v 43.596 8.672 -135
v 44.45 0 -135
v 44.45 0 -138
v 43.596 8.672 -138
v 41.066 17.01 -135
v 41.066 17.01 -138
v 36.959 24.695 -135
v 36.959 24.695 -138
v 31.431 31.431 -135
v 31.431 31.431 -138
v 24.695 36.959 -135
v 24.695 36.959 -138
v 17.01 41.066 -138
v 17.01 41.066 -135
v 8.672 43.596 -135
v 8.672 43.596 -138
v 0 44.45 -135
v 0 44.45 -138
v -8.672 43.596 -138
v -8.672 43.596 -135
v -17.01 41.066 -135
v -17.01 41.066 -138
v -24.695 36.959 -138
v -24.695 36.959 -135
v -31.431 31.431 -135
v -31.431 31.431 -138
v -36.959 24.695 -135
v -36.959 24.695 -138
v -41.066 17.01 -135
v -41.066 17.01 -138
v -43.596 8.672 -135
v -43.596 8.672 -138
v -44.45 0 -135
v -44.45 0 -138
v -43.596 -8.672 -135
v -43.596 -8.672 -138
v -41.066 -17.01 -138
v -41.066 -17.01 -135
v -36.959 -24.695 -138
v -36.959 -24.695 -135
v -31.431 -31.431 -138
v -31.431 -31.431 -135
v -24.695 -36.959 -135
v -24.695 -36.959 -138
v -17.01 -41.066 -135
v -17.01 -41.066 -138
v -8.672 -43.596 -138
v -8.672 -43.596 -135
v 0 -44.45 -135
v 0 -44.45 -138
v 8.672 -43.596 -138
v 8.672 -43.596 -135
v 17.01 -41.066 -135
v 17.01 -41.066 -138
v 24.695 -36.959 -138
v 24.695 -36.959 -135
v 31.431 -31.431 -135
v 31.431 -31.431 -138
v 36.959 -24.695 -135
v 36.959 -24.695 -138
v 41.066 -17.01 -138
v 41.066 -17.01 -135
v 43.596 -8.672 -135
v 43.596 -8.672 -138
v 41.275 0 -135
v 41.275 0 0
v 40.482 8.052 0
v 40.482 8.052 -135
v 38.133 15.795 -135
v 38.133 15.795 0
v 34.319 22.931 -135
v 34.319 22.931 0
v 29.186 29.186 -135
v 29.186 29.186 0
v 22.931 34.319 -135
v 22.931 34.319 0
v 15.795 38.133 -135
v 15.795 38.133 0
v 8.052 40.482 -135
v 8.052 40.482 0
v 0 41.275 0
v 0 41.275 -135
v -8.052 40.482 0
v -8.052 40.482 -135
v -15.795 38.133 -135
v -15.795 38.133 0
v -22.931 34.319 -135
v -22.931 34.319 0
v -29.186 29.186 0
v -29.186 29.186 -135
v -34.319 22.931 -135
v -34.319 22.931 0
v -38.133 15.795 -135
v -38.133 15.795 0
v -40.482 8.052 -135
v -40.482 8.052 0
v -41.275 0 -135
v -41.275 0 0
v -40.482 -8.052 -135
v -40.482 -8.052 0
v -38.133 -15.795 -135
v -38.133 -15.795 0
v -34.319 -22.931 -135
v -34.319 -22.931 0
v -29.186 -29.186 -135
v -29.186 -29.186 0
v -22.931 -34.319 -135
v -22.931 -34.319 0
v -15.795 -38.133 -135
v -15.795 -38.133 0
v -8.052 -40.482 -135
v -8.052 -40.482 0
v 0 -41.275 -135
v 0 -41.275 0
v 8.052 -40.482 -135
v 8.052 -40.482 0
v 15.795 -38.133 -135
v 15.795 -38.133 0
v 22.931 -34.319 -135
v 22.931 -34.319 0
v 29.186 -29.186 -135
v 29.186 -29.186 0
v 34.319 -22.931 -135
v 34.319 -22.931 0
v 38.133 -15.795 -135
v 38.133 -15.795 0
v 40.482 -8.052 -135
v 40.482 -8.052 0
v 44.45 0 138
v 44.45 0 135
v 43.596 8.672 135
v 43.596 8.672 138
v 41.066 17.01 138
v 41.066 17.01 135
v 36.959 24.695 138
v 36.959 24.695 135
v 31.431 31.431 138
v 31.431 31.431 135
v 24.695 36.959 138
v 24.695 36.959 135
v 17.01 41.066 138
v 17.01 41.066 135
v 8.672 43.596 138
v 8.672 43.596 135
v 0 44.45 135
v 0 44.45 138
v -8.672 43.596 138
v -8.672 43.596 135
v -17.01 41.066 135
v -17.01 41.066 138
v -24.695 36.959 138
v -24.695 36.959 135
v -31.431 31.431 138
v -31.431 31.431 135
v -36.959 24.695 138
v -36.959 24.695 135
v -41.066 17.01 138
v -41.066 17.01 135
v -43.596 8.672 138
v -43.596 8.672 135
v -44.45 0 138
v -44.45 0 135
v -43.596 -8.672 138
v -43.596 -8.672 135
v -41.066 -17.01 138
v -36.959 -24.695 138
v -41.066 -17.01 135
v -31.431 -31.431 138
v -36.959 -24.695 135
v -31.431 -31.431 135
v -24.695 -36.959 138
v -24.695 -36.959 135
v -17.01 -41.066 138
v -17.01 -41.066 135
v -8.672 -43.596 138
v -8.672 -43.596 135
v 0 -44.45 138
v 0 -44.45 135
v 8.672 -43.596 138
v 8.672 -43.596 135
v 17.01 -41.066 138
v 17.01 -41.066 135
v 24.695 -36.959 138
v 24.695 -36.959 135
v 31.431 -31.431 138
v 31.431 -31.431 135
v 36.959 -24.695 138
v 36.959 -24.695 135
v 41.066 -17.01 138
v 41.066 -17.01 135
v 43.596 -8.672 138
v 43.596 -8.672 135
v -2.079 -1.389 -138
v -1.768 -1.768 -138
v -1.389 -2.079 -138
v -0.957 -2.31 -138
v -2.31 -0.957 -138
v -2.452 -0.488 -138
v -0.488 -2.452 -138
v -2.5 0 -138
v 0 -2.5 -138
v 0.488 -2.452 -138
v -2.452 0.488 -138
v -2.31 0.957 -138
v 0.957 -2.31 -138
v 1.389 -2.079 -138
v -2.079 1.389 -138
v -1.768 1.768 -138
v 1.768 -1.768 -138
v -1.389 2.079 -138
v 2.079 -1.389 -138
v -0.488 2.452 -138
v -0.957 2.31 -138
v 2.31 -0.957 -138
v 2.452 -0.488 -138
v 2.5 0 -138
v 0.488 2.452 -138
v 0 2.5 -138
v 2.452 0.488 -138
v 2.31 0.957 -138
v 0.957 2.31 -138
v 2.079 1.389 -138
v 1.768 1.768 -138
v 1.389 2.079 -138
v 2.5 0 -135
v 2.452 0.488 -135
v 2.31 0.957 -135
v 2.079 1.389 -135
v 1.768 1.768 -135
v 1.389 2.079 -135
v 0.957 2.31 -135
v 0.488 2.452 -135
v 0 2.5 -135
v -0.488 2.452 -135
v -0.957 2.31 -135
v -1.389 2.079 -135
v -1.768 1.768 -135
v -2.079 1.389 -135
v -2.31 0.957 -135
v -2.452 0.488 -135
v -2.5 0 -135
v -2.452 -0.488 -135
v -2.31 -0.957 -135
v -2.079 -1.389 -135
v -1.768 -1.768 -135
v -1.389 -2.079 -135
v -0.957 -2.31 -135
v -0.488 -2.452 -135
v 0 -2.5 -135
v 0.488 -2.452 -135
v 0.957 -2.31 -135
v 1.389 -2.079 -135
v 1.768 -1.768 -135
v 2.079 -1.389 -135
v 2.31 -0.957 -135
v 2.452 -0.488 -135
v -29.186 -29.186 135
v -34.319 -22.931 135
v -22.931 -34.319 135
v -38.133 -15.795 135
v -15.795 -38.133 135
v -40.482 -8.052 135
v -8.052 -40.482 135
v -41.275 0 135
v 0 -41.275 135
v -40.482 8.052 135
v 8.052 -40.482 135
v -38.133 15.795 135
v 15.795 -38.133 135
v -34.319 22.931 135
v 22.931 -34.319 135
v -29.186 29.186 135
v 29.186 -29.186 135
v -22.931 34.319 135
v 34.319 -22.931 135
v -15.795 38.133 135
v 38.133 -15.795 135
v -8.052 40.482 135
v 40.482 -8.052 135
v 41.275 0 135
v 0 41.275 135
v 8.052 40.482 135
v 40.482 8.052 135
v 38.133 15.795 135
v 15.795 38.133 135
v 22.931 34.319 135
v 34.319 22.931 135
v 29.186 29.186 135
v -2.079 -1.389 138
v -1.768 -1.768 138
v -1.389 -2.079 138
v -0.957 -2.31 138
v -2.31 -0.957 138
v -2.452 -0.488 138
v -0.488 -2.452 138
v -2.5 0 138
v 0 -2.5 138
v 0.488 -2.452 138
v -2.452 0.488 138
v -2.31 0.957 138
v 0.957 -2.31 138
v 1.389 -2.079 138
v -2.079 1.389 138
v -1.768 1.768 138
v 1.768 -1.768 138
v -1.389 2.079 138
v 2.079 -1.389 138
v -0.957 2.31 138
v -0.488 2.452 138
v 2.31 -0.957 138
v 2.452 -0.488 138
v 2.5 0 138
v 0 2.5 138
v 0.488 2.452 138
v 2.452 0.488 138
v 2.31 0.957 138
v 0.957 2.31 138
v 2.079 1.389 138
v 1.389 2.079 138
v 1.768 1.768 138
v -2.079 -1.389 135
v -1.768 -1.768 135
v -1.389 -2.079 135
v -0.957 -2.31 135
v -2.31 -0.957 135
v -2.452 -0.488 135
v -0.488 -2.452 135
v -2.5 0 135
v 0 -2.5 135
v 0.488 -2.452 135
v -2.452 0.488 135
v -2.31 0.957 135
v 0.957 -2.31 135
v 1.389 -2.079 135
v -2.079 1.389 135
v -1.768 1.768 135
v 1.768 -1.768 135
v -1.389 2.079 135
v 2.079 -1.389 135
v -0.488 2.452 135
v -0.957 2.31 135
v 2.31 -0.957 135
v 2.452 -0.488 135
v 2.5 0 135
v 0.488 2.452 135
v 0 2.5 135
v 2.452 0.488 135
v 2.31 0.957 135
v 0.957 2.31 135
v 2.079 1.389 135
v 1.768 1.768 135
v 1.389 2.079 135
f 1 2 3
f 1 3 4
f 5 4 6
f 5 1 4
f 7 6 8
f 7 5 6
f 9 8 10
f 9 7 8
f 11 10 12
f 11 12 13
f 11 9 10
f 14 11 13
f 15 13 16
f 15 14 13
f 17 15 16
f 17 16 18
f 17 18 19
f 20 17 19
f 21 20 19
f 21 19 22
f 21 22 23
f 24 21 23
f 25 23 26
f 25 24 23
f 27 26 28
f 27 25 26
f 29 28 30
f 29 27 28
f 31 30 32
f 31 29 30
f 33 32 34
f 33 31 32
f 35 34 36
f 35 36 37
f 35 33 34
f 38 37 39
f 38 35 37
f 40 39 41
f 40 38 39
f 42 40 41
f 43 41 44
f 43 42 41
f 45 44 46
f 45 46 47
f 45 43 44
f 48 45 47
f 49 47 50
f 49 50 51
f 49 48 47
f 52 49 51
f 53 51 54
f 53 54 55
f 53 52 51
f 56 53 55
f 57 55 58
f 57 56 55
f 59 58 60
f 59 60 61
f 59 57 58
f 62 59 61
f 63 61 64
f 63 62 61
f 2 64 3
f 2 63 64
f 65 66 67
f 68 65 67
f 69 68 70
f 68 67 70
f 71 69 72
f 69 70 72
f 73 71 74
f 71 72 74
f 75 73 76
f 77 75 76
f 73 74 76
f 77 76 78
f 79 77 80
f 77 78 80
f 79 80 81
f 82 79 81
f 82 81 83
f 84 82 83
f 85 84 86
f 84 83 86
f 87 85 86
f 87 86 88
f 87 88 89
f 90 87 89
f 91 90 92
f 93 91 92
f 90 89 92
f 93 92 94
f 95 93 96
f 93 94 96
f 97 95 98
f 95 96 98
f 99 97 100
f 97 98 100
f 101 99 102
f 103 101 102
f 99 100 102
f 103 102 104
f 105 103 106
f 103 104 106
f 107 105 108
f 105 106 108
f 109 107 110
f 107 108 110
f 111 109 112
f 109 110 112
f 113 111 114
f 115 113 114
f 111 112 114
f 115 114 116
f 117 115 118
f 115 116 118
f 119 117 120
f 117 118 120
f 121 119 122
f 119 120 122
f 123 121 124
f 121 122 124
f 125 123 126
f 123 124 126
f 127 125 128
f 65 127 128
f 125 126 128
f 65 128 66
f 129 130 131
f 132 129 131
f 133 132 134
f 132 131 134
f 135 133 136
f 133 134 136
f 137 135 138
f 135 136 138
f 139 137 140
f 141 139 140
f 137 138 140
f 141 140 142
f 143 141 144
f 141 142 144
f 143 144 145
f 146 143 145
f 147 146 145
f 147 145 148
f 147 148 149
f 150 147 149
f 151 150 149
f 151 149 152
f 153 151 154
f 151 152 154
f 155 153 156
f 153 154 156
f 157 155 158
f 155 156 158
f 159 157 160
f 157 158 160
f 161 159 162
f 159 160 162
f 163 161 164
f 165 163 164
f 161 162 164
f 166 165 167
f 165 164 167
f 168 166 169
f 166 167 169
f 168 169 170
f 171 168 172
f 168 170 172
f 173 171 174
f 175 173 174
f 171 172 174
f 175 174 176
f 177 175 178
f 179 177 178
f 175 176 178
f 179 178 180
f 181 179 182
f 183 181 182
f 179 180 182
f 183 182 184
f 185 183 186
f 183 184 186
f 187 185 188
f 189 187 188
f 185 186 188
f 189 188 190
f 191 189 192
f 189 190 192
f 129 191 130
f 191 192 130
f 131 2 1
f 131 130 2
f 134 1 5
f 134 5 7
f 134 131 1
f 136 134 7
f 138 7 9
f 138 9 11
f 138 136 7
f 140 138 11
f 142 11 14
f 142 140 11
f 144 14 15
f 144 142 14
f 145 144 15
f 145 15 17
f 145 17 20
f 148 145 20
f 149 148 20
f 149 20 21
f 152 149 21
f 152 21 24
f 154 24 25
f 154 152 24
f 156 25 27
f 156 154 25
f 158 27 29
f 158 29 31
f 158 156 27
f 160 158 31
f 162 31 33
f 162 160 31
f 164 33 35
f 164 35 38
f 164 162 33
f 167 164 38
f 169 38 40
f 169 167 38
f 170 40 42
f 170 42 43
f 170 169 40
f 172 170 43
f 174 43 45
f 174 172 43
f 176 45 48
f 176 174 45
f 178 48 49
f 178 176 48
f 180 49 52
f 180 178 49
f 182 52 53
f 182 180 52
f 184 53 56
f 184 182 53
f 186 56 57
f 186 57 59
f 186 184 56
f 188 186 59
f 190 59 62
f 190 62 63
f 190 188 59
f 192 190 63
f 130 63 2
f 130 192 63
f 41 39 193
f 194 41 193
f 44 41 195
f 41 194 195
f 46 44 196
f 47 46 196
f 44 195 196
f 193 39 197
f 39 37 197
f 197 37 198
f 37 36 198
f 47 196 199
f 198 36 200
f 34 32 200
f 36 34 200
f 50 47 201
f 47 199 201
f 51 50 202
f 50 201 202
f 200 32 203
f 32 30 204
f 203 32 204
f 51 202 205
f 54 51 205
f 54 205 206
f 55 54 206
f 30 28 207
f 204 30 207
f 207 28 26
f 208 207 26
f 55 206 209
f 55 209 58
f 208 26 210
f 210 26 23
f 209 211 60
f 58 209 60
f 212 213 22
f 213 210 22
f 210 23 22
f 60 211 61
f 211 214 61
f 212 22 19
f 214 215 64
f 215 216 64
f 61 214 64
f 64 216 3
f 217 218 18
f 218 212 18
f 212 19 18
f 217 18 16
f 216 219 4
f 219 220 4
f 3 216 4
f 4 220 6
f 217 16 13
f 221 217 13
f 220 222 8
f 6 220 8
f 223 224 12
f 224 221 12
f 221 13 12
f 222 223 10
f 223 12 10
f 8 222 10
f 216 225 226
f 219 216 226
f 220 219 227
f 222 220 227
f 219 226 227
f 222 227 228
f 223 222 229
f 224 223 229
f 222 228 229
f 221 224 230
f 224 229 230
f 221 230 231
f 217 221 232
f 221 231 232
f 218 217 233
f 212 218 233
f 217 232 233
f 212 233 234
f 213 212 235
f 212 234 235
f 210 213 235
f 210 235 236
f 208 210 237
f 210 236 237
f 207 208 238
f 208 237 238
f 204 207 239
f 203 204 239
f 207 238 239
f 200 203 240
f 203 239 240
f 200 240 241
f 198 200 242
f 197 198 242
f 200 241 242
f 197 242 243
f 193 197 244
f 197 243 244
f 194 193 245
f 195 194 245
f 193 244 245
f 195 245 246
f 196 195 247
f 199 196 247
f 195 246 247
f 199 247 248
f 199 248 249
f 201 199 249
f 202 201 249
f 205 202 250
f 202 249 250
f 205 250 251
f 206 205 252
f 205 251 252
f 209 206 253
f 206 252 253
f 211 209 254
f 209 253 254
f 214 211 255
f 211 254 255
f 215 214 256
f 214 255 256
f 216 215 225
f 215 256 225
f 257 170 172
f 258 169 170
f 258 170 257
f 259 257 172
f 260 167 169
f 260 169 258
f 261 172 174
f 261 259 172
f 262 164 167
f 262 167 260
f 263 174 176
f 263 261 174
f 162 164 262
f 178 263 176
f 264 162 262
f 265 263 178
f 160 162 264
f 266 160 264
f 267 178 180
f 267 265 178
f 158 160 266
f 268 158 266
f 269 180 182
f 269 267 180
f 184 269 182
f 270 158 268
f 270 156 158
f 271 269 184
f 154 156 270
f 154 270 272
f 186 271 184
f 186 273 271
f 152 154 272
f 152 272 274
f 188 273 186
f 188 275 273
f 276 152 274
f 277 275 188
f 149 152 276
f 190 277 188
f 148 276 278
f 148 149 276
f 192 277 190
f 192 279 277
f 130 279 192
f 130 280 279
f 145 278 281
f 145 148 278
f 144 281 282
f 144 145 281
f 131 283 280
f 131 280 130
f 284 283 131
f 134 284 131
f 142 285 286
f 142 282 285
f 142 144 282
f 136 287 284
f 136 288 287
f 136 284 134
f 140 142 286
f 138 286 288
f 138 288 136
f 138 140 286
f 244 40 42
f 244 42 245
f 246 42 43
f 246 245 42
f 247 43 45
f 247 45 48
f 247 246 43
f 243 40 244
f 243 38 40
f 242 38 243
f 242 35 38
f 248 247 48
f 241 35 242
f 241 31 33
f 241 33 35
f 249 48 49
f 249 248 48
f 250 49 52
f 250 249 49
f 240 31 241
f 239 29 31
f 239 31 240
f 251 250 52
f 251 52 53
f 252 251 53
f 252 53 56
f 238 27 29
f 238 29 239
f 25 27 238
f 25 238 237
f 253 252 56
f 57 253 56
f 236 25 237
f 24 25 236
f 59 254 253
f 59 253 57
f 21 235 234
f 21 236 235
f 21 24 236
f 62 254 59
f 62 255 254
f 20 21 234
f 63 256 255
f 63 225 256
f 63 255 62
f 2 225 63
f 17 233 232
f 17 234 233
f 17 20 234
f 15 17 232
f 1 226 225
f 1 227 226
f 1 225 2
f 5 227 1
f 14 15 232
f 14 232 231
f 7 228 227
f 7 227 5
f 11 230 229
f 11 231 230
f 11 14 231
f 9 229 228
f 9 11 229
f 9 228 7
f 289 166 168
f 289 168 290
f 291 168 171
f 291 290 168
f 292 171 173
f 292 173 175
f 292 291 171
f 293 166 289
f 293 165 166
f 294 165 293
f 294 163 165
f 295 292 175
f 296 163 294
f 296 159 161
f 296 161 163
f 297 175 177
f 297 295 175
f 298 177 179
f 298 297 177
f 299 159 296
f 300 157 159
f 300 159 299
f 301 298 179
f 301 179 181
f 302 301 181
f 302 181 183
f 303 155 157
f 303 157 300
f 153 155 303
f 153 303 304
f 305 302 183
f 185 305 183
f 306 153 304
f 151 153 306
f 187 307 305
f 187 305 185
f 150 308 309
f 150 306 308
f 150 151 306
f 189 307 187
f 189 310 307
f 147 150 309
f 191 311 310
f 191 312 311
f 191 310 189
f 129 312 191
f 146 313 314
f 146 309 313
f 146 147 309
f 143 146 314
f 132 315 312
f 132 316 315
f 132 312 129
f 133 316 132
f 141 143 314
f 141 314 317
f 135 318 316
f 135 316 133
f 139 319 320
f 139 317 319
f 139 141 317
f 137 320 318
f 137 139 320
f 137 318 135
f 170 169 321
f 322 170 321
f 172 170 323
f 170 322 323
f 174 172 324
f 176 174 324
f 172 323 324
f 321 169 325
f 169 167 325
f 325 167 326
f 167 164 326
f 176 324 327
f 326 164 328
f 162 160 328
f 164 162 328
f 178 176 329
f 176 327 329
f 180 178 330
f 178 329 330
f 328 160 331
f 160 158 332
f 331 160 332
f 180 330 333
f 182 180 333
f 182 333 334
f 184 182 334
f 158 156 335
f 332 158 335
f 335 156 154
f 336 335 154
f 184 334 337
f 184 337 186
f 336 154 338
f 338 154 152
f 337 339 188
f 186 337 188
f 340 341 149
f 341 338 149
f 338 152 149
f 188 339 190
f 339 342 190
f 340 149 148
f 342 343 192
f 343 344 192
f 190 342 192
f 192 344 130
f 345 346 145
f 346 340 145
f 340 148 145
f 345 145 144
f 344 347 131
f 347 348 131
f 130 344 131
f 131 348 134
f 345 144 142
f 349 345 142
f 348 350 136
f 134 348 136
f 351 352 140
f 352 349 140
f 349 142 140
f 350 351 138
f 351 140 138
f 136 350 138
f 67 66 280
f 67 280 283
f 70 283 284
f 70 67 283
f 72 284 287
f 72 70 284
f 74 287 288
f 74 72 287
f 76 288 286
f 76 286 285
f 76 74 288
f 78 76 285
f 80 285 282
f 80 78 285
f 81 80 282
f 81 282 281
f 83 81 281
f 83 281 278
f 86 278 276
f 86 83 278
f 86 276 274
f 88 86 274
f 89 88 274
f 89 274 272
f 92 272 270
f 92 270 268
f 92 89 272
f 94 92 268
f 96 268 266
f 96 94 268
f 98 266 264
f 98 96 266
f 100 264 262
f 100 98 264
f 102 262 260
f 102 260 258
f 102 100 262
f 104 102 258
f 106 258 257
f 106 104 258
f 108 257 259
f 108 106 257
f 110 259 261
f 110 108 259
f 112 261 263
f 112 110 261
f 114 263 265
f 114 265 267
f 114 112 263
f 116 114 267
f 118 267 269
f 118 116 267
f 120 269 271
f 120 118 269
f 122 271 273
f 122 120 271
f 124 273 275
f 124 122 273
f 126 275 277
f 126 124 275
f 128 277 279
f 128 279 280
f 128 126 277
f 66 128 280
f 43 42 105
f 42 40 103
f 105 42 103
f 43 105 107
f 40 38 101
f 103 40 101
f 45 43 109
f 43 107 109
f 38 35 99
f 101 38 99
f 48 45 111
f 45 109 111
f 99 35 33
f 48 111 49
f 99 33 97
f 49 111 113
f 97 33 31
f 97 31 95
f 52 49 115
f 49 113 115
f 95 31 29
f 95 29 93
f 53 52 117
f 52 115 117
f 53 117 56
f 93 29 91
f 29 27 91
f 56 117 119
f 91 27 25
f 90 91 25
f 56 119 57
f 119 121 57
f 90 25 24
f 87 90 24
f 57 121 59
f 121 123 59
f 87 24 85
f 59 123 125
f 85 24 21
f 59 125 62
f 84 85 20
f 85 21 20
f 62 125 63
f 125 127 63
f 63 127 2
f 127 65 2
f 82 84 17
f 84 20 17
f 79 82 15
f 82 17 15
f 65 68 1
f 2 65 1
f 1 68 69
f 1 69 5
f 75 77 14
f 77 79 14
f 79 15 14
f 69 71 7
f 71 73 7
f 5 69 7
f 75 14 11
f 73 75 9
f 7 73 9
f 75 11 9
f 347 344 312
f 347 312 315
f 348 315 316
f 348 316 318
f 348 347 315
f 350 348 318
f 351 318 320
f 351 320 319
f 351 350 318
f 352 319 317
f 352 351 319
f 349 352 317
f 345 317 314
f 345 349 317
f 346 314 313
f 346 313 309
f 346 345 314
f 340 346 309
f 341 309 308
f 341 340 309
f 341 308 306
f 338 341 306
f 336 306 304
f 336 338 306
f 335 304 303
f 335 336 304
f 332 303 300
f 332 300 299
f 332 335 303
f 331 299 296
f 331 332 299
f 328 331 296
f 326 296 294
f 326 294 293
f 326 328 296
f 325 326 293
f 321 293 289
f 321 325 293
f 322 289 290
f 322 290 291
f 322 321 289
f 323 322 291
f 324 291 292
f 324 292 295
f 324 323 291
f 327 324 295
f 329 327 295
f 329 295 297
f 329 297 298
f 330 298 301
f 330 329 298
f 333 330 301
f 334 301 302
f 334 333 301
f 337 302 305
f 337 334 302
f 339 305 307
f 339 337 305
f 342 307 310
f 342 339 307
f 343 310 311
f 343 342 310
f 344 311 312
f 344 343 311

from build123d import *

# Parameters (mm, degrees)
F1_R          = 44.45
F1_R_2        = 41.275
F2_DEPTH      = 135
F2_DEPTH_BACK = 135
F3_R          = 44.45
F3_R_2        = 2.5
F4_DEPTH      = 3


with BuildPart() as f2:
    # F1 (on Top) → F2 (new body, two sides)
    with BuildSketch(Plane.XY) as f2_sk:
        Circle(F1_R)
        Circle(F1_R_2, mode=Mode.SUBTRACT)
    extrude(amount=F2_DEPTH)
    extrude(f2_sk.sketch, amount=-F2_DEPTH_BACK)


with BuildPart() as f4:
    # F3 (on face) → F4 (new body)
    with BuildSketch(Plane.XY.offset(135)):
        Circle(F3_R)
        Circle(F3_R_2, mode=Mode.SUBTRACT)
    extrude(amount=F4_DEPTH)


with BuildPart() as f5_1:
    # F5: instance of F4
    add(f4.part.mirror(Plane.XY))


solid = Compound([f2.part, f4.part, f5_1.part])
